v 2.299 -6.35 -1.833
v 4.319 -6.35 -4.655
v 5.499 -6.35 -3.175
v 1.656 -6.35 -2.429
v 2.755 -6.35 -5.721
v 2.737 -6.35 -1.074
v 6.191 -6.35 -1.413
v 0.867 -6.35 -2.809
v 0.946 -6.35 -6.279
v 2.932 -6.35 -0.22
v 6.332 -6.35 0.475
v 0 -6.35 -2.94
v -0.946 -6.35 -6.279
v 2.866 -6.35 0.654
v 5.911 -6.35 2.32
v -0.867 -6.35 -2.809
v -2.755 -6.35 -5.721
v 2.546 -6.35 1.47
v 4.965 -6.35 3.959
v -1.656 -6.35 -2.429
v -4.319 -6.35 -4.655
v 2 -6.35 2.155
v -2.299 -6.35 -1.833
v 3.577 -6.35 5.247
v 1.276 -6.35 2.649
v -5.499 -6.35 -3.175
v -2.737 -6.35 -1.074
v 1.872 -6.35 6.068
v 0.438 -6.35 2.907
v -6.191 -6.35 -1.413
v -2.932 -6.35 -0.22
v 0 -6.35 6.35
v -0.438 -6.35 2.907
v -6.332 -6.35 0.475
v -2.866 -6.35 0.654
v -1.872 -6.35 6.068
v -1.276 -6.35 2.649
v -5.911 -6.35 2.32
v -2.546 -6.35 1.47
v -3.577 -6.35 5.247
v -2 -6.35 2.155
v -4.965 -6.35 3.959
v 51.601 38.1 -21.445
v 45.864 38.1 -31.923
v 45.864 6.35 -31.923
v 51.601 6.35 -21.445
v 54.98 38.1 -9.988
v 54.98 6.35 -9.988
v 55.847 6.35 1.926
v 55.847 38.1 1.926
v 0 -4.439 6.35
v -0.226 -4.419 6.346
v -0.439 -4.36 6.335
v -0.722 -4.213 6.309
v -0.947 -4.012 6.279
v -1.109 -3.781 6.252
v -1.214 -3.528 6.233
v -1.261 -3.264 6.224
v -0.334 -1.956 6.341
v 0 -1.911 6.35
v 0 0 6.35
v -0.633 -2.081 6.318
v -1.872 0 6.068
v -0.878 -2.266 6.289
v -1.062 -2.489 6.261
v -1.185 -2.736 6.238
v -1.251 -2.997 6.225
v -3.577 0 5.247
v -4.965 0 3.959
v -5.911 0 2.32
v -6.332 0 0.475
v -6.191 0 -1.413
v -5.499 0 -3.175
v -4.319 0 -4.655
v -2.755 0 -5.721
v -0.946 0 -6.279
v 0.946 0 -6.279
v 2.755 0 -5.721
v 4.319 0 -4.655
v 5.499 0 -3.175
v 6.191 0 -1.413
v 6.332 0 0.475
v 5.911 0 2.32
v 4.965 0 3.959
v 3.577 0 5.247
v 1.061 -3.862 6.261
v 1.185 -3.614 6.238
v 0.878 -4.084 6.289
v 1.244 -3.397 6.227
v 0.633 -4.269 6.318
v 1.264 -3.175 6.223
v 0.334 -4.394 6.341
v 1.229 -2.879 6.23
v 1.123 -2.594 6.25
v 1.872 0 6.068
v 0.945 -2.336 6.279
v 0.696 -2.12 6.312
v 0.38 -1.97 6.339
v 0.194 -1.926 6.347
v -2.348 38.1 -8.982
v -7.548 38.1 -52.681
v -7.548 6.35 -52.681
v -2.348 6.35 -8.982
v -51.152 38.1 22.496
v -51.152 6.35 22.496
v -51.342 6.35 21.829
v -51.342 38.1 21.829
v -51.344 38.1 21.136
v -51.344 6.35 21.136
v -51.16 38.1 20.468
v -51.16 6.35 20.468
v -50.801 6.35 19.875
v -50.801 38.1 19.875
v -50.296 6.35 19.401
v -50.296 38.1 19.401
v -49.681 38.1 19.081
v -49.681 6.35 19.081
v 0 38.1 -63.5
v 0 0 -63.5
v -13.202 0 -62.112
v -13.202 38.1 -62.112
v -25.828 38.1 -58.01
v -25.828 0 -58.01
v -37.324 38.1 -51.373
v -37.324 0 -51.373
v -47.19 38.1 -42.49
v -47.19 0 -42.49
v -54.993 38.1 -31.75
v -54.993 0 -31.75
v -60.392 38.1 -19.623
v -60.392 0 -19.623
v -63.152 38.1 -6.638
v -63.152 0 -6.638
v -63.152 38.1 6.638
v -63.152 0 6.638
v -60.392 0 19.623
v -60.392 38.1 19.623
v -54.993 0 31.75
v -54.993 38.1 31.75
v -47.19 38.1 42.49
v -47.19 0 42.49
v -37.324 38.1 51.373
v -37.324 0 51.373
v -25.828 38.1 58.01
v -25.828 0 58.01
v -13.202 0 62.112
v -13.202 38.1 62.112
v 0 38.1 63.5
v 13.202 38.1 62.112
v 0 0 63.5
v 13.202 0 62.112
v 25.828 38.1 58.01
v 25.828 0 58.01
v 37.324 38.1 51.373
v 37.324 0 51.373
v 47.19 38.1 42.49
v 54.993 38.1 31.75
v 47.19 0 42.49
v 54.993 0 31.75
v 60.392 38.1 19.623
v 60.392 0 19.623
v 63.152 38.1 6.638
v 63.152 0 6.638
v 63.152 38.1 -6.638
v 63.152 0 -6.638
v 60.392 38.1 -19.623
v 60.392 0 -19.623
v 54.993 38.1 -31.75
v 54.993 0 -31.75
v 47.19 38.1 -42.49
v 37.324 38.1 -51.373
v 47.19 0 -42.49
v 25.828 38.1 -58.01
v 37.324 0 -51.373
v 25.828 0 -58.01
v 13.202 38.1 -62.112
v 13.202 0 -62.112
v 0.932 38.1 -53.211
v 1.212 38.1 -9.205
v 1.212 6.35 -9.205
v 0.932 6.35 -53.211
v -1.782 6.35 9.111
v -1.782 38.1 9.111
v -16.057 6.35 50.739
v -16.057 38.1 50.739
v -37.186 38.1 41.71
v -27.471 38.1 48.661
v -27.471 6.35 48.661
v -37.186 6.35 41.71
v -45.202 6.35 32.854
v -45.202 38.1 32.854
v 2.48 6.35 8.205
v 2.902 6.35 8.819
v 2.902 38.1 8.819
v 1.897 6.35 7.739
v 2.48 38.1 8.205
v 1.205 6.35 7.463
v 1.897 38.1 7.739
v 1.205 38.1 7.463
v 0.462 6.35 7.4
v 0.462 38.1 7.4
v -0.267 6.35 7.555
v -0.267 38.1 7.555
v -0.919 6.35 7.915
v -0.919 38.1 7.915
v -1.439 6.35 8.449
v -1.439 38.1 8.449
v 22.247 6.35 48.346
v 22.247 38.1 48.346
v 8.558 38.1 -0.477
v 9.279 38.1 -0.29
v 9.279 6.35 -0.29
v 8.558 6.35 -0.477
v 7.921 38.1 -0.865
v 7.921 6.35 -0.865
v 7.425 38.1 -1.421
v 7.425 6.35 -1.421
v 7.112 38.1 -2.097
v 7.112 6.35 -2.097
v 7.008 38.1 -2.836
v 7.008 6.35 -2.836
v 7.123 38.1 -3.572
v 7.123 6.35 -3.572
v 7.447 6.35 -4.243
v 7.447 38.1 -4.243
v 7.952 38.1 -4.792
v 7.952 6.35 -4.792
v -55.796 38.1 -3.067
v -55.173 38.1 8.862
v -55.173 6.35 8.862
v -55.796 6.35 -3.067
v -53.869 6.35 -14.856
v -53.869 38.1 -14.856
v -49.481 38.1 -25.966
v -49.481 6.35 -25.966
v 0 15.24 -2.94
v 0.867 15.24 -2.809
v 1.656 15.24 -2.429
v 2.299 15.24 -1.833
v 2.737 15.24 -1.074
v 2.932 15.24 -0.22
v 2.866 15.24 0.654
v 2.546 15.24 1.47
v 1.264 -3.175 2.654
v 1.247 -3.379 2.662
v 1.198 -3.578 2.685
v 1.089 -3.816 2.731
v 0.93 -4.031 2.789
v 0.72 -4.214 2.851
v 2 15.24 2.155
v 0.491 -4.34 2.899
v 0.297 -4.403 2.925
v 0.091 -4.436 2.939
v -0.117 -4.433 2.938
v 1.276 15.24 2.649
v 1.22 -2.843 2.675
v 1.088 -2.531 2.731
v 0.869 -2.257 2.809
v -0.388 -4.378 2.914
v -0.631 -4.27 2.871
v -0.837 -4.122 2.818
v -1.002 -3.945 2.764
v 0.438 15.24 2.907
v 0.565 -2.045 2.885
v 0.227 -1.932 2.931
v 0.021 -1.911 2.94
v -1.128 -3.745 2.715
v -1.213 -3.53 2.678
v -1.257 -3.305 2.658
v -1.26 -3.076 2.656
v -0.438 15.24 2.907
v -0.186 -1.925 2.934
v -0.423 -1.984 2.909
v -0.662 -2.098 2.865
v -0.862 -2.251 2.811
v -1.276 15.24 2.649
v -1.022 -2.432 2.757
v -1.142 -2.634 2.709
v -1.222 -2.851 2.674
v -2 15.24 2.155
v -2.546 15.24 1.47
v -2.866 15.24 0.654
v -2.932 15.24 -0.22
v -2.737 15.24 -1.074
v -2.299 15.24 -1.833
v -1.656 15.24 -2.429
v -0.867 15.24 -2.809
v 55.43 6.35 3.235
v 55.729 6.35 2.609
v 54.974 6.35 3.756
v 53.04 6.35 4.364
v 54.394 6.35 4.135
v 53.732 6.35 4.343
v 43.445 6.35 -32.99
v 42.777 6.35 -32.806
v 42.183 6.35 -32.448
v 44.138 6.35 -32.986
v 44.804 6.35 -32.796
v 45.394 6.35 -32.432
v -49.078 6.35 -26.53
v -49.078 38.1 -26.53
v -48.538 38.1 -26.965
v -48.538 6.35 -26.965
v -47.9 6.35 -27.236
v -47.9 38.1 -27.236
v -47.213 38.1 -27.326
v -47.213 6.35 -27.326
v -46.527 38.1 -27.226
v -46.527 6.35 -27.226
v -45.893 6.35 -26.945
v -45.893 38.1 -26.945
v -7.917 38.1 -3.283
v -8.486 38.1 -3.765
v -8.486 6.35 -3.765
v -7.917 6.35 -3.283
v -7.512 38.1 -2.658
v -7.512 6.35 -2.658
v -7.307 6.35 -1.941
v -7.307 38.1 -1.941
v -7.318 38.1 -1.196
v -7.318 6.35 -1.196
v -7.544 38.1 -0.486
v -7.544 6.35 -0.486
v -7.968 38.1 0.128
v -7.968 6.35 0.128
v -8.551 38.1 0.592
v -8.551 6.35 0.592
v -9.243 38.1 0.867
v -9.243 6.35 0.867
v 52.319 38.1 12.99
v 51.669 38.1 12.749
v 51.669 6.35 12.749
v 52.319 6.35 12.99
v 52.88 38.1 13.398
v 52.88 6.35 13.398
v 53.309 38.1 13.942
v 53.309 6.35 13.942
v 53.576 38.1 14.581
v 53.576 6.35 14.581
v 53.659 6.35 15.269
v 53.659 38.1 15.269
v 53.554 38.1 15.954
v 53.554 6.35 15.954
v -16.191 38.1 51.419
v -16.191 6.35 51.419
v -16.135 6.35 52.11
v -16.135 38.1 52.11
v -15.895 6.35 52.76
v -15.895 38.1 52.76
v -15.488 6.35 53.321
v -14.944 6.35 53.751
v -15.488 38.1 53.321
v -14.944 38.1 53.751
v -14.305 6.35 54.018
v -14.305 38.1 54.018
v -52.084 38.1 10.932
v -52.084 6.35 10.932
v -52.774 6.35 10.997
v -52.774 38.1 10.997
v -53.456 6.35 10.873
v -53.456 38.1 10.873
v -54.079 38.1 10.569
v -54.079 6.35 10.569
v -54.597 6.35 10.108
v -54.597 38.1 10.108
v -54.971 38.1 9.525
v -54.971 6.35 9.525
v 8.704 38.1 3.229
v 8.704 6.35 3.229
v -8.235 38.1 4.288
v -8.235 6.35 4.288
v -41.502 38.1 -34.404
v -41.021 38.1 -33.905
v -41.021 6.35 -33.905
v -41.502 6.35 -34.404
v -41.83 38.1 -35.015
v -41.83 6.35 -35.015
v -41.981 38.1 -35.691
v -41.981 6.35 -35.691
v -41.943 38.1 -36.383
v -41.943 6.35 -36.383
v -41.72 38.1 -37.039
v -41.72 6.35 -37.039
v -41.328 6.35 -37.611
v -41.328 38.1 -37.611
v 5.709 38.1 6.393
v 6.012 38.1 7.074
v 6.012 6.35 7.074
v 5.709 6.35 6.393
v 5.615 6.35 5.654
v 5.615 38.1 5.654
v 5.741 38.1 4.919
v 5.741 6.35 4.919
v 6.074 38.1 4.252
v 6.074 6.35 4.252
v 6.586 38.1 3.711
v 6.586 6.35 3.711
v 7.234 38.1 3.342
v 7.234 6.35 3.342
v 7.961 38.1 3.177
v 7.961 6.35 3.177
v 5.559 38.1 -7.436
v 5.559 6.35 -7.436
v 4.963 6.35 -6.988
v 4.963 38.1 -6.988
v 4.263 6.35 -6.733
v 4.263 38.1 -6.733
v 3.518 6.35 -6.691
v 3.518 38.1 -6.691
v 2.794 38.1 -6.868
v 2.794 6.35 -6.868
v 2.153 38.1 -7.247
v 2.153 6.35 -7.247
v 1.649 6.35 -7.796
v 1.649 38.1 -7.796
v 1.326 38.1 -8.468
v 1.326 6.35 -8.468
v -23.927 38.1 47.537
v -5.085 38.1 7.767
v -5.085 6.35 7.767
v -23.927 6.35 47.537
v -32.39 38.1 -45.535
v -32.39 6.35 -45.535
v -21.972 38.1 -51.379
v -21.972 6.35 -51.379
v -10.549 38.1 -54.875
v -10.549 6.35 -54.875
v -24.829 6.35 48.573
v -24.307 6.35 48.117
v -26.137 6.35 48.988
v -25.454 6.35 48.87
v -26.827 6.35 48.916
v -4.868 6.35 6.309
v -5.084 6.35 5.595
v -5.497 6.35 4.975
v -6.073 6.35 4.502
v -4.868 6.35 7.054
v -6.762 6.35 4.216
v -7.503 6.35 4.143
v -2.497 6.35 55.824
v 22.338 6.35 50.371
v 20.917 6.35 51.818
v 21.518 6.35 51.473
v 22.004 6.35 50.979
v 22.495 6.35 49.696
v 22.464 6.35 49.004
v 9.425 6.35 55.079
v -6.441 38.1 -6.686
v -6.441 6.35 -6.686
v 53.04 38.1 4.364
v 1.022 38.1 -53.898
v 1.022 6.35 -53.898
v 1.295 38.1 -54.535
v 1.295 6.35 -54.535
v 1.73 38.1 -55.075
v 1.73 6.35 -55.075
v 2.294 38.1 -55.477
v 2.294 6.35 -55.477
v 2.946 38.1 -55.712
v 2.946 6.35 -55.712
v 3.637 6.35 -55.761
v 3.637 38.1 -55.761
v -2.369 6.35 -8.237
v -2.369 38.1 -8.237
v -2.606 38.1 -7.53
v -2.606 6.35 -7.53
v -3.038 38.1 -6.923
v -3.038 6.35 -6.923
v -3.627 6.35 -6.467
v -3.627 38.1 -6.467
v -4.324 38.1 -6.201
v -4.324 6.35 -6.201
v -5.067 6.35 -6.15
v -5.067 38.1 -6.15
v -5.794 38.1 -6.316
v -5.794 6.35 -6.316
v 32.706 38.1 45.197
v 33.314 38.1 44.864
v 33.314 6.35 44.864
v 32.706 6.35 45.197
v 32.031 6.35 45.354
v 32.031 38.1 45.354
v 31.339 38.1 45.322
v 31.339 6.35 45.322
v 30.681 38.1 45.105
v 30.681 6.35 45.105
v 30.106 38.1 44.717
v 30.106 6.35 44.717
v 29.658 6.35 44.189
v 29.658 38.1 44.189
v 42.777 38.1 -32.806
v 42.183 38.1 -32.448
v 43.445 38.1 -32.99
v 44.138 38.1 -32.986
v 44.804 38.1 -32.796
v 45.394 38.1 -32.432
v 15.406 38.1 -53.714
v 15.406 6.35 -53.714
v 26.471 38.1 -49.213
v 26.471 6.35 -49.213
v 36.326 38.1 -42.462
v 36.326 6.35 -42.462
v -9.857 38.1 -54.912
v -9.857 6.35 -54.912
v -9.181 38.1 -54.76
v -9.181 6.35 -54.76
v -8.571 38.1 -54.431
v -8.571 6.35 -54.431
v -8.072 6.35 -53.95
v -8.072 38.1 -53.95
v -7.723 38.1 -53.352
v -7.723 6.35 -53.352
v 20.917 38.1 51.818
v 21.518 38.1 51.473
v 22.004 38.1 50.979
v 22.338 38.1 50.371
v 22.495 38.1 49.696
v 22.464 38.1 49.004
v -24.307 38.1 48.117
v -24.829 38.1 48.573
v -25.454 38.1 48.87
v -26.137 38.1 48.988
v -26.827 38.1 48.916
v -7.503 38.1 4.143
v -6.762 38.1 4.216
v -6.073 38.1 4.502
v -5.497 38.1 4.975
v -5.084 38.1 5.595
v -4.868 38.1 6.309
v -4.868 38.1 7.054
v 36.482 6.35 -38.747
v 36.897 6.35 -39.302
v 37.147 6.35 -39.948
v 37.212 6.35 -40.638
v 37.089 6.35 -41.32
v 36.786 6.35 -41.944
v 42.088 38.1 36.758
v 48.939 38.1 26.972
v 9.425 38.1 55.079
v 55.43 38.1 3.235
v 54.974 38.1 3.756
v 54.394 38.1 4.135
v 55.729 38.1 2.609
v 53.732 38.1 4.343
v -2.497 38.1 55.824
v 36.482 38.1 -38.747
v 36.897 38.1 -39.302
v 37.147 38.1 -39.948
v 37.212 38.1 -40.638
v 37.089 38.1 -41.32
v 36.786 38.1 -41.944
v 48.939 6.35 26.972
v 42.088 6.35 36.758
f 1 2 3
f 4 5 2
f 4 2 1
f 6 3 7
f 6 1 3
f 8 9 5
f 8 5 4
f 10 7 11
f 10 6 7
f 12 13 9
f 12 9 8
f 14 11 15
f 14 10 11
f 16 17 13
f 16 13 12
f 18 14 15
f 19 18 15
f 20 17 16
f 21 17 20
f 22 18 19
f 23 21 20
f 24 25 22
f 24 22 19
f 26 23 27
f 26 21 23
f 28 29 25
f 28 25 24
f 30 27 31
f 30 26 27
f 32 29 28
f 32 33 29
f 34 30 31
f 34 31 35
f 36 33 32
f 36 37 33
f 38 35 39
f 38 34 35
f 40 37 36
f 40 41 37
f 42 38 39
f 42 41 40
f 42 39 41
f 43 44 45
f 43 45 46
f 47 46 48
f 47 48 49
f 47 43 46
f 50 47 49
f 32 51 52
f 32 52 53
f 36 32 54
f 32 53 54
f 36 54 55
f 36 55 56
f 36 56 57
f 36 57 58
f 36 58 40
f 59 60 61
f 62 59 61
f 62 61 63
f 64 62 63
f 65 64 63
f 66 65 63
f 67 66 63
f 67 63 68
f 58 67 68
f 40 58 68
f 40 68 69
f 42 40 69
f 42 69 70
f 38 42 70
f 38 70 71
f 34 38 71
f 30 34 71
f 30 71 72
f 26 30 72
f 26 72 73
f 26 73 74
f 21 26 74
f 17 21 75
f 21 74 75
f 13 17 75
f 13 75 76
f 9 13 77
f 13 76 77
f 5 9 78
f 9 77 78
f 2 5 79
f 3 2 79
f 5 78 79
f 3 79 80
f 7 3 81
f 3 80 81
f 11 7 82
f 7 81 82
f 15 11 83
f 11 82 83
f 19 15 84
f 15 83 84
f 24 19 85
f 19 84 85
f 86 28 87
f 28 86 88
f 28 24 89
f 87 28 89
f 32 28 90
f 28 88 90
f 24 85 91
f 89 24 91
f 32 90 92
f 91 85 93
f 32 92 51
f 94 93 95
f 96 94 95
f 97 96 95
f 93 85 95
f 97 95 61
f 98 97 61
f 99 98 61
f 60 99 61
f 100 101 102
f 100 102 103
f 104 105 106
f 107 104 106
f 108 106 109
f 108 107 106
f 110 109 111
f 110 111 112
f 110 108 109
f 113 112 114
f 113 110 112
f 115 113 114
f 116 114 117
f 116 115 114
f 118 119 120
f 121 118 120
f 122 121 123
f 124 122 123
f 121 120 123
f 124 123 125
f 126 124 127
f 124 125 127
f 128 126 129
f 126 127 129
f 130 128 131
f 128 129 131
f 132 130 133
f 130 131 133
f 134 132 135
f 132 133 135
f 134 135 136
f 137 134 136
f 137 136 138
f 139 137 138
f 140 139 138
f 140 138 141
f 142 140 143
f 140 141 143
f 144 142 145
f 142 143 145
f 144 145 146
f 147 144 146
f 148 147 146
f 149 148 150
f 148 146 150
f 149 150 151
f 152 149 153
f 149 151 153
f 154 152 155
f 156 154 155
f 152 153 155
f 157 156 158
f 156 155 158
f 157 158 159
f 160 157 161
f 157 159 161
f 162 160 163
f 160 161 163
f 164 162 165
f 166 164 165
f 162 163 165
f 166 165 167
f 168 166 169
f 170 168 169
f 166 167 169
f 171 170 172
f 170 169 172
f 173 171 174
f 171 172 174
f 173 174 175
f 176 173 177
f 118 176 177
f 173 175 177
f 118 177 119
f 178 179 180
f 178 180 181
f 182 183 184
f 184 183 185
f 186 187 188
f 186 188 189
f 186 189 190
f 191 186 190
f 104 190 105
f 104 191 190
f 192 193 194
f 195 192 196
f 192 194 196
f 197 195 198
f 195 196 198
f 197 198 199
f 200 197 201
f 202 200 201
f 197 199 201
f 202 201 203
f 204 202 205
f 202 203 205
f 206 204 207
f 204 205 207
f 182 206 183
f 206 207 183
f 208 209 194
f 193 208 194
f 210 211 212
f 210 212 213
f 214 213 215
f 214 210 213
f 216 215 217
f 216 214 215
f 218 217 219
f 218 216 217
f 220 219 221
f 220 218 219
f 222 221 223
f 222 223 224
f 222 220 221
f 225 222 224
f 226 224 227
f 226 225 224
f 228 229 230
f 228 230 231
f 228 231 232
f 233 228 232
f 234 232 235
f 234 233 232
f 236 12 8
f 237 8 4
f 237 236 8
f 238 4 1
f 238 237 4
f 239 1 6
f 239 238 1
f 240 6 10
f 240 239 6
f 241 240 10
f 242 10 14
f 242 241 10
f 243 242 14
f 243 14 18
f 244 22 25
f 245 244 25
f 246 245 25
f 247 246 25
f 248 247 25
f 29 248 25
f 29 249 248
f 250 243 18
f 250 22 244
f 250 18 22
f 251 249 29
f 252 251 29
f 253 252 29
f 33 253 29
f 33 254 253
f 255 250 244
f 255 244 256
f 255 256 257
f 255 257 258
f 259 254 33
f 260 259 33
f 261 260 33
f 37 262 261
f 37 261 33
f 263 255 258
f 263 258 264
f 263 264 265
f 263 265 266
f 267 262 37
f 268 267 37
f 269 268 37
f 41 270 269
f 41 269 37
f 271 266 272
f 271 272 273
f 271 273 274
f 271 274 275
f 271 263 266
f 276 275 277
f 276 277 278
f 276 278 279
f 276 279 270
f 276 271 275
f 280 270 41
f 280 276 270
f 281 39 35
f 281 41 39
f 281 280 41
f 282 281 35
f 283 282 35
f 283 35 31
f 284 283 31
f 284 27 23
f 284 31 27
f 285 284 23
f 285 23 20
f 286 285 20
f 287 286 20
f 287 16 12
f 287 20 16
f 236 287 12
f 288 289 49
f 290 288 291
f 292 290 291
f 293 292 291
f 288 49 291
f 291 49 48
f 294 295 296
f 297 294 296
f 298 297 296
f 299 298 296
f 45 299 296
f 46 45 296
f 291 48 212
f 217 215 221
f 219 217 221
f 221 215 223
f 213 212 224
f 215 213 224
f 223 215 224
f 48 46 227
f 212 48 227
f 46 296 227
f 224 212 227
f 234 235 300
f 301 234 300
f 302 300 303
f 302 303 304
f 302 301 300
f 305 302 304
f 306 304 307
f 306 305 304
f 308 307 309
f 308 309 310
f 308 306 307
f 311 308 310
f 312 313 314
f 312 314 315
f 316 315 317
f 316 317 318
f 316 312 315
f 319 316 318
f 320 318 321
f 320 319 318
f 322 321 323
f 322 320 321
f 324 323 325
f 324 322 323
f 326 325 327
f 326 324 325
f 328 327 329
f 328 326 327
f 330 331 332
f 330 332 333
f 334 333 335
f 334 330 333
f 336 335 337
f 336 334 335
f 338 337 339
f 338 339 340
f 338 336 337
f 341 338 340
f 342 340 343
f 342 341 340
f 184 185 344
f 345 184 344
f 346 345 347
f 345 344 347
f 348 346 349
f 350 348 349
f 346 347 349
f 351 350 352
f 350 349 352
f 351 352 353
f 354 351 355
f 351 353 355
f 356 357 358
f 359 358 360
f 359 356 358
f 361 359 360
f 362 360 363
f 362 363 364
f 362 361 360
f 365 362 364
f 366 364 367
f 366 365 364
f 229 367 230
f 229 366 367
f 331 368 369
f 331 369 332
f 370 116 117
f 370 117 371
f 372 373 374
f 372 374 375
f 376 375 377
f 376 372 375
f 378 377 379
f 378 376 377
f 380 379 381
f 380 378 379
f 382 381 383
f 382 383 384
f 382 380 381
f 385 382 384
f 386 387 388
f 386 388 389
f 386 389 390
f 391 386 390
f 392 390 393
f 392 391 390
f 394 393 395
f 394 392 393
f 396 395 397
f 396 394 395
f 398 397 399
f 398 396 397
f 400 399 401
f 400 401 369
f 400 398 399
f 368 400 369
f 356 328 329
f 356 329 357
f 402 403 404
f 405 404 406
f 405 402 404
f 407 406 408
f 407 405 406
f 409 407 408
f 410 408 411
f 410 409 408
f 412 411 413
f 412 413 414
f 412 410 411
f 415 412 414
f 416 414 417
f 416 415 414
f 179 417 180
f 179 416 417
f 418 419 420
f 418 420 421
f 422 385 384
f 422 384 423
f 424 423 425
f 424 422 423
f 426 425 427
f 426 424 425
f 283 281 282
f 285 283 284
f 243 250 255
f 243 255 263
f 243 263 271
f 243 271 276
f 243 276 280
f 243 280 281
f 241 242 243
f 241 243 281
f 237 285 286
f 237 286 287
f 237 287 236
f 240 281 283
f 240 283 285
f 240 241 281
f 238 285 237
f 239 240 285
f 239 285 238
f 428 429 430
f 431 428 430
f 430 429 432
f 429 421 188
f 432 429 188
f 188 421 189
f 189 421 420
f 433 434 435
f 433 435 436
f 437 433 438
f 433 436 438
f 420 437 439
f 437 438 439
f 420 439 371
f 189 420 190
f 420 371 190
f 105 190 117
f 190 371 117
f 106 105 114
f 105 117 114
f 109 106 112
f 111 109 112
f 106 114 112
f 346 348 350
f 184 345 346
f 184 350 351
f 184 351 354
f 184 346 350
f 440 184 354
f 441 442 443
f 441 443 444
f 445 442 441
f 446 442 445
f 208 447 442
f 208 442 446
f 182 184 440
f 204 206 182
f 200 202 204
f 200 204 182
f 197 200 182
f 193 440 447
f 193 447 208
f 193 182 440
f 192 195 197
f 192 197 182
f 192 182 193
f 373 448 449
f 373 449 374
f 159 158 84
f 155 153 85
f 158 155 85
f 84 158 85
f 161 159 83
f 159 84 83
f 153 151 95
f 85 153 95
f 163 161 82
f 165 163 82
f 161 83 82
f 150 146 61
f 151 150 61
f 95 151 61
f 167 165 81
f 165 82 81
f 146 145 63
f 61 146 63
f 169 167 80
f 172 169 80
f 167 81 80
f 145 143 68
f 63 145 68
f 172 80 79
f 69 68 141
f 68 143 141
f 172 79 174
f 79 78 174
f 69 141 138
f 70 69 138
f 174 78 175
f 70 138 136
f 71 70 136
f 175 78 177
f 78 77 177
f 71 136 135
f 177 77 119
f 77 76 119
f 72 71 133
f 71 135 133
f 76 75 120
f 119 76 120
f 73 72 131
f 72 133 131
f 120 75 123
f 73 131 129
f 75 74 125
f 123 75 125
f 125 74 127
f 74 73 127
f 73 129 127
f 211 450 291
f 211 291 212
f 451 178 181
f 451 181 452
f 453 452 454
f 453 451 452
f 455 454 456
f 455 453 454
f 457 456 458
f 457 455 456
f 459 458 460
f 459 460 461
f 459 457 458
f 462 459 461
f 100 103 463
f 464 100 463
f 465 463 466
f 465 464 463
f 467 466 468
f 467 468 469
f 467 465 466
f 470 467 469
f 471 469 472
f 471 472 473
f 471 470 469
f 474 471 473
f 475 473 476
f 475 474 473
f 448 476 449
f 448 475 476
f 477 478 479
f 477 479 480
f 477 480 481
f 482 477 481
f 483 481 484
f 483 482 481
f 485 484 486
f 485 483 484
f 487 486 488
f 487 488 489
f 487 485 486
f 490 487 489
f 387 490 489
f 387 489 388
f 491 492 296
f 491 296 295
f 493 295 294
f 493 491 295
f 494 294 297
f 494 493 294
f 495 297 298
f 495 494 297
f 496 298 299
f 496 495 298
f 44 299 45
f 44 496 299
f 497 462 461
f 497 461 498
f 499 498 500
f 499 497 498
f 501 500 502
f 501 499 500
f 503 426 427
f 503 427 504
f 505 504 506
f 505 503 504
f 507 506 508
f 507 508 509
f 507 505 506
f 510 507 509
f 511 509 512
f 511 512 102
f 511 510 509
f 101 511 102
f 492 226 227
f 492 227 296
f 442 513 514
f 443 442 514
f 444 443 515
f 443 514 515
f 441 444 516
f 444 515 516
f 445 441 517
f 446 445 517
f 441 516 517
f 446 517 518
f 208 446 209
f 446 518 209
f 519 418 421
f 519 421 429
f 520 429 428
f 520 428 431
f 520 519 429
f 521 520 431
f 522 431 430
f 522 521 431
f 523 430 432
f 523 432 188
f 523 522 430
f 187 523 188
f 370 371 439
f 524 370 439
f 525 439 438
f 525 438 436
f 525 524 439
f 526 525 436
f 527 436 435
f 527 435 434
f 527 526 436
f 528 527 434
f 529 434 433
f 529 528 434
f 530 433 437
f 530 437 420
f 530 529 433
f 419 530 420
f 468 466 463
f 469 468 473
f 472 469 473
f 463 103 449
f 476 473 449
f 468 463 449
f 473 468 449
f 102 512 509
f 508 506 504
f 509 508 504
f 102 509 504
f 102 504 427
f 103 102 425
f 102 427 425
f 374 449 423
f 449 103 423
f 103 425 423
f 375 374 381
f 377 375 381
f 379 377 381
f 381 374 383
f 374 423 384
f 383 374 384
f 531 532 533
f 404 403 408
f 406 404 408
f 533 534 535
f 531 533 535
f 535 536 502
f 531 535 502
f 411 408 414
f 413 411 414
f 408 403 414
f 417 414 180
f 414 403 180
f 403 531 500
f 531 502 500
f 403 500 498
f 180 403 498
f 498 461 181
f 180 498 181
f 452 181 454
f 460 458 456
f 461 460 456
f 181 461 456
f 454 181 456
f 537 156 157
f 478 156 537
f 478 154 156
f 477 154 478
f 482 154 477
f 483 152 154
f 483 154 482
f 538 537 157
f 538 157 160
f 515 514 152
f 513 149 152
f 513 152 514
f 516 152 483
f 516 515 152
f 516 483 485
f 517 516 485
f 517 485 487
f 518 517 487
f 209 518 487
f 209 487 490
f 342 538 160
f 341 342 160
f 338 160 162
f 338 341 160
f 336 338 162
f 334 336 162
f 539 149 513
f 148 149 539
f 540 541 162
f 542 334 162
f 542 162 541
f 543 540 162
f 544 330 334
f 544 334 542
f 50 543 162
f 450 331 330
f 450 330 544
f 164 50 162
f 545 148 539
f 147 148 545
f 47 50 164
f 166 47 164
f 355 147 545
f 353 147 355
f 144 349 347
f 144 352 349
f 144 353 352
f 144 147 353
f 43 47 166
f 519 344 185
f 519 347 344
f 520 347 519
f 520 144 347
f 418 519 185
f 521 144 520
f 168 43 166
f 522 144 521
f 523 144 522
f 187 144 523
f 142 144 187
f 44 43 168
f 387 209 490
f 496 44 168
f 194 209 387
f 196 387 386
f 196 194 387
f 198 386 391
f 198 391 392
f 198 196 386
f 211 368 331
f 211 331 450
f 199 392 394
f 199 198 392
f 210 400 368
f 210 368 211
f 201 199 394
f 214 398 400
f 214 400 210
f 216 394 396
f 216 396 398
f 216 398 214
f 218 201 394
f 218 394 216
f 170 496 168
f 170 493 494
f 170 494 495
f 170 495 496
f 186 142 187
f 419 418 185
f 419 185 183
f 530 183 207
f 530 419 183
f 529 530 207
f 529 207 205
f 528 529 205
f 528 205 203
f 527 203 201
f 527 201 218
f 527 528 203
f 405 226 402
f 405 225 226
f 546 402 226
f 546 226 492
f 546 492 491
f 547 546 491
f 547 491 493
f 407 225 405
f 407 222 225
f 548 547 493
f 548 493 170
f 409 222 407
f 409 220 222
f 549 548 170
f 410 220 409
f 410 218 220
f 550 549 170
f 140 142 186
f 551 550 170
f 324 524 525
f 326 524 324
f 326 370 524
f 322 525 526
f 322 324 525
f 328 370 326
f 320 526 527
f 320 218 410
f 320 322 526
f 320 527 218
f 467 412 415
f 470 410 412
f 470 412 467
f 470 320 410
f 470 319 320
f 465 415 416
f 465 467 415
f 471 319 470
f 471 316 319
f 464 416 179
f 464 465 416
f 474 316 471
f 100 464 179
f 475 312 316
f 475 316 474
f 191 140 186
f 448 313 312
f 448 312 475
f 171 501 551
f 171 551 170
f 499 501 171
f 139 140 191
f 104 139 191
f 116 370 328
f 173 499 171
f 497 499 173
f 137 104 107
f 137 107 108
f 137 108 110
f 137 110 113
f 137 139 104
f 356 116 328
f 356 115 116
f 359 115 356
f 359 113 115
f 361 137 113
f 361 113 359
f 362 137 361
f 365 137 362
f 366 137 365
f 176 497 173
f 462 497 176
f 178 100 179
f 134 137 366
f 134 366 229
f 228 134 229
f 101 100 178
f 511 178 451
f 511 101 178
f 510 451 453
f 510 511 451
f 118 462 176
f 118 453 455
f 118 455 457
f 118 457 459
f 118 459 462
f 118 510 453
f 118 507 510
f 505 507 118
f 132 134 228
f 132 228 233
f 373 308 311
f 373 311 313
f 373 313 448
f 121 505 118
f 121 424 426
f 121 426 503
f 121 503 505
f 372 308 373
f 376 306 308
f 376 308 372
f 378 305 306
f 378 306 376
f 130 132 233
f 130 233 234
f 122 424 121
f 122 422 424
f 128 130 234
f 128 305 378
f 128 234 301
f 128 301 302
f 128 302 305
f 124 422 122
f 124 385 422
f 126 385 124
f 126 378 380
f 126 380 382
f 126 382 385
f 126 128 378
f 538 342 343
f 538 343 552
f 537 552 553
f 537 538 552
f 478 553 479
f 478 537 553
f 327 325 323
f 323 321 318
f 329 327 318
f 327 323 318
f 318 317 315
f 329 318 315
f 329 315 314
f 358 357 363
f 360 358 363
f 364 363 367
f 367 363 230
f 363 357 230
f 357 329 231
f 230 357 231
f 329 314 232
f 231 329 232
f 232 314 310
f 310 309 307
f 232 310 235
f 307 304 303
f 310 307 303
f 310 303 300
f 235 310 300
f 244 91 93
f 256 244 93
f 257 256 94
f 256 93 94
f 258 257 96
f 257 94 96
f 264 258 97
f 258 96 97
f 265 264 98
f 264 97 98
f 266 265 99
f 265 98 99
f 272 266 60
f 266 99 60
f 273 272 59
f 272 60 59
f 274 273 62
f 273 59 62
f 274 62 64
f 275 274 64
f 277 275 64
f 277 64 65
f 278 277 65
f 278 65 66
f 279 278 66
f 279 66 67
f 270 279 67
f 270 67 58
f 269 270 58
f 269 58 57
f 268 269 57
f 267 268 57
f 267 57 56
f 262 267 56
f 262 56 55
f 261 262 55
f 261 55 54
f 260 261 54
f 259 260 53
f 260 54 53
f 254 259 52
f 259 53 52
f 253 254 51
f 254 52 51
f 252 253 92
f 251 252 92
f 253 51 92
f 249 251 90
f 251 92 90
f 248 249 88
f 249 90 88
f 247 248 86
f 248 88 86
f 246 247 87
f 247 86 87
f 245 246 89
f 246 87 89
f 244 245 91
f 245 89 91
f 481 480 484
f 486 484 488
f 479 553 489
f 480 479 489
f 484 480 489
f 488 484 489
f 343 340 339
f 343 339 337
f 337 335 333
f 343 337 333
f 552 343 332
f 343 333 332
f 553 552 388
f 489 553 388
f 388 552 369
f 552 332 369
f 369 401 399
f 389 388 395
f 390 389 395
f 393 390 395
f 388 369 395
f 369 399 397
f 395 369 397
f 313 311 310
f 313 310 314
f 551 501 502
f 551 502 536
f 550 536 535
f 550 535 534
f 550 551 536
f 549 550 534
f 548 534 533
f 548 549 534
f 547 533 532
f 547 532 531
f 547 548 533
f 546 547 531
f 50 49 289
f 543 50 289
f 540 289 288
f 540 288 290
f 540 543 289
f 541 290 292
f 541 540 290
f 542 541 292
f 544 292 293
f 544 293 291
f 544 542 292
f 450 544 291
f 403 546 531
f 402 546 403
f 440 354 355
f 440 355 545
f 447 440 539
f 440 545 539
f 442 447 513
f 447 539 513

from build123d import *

# Parameters (mm, degrees)
SKETCH1_R               = 63.5
BOSS_EXTRUDE1_DEPTH     = 38.1
CUT_EXTRUDE2_DEPTH      = 31.75
SKETCH4_R               = 6.35
BOSS_EXTRUDE2_DEPTH     = 6.35
CUT_EXTRUDE3_DEPTH      = 98.550550998
CUT_EXTRUDE3_DEPTH_BACK = 15.24
SKETCH3_R               = 2.94
CUT_EXTRUDE4_REACH      = 103.798
CUT_EXTRUDE4_END_RADIUS = 2.94
SKETCH5_R               = 1.263861724


with BuildPart() as part:
    # Sketch1 → Boss-Extrude1 (new body)
    with BuildSketch(Plane(origin=(0, 0, 0), x_dir=(1, 0, 0), z_dir=(0, 1, 0))):
        with Locations(Location((0, 0, 0), (0, 0, 90))):
            Circle(SKETCH1_R)
    extrude(amount=BOSS_EXTRUDE1_DEPTH)

    # Sketch2 → Cut-Extrude2 (cut)
    with BuildSketch(Plane(origin=(0, 38.1, 0), x_dir=(1, 0, 0), z_dir=(0, 1, 0))):
        with BuildLine():
            Line((-1.7819572, -9.111319007), (-16.057301334, -50.738697991))
            ThreePointArc((-16.057301334, -50.738697991), (-15.89484722, -52.75977688), (-14.304875125, -54.018005773))
            ThreePointArc((-14.304875125, -54.018005773), (3.484226214, -55.771270092), (20.916794468, -51.817584942))
            ThreePointArc((20.916794468, -51.817584942), (22.337802979, -50.371249564), (22.247447967, -48.345666393))
            Line((22.247447967, -48.345666393), (2.902107489, -8.818689111))
            ThreePointArc((2.902107489, -8.818689111), (0.462316687, -7.400205158), (-1.7819572, -9.111319007))
        make_face()
        with BuildLine():
            Line((8.704163204, -3.229403726), (51.669220951, -12.749274735))
            ThreePointArc((51.669220951, -12.749274735), (53.309221074, -13.941562792), (53.554027291, -15.954327341))
            ThreePointArc((53.554027291, -15.954327341), (45.776114287, -32.048740393), (33.314033776, -44.863677441))
            ThreePointArc((33.314033776, -44.863677441), (31.338979429, -45.322274799), (29.657547842, -44.189164464))
            Line((29.657547842, -44.189164464), (6.012483905, -7.074004722))
            ThreePointArc((6.012483905, -7.074004722), (6.073963109, -4.252498707), (8.704163204, -3.229403726))
        make_face()
        with BuildLine():
            Line((7.951806494, 4.791688532), (42.1830167, 32.447580836))
            ThreePointArc((42.1830167, 32.447580836), (44.13770839, 32.986405118), (45.863985261, 31.922864157))
            ThreePointArc((45.863985261, 31.922864157), (53.597654639, 15.807144497), (55.846795761, -1.926084944))
            ThreePointArc((55.846795761, -1.926084944), (54.973915369, -3.756175388), (53.039658589, -4.3642888))
            Line((53.039658589, -4.3642888), (9.279401997, 0.290179402))
            ThreePointArc((9.279401997, 0.290179402), (7.111791423, 2.097426005), (7.951806494, 4.791688532))
        make_face()
        with BuildLine():
            Line((1.211577307, 9.204541593), (0.932140496, 53.210746228))
            ThreePointArc((0.932140496, 53.210746228), (1.729601044, 55.074937175), (3.637426875, 55.761487836))
            ThreePointArc((3.637426875, 55.761487836), (21.059067856, 51.759927174), (36.325781471, 42.461888801))
            ThreePointArc((36.325781471, 42.461888801), (37.212371773, 40.638400701), (36.481824607, 38.746985345))
            Line((36.481824607, 38.746985345), (5.55874112, 7.435852518))
            ThreePointArc((5.55874112, 7.435852518), (2.794295742, 6.867946156), (1.211577307, 9.204541593))
        make_face()
        with BuildLine():
            Line((-6.440994304, 6.686187096), (-41.020656513, 33.905134408))
            ThreePointArc((-41.020656513, 33.905134408), (-41.980931166, 35.690918215), (-41.328188139, 37.610573848))
            ThreePointArc((-41.328188139, 37.610573848), (-27.33742655, 48.736428979), (-10.549287178, 54.875194214))
            ThreePointArc((-10.549287178, 54.875194214), (-8.570846762, 54.431432191), (-7.547567398, 52.680989231))
            Line((-7.547567398, 52.680989231), (-2.347765198, 8.982177024))
            ThreePointArc((-2.347765198, 8.982177024), (-3.627361626, 6.466762771), (-6.440994304, 6.686187096))
        make_face()
        with BuildLine():
            Line((-9.243365832, -0.867002658), (-52.084062499, -10.931735159))
            ThreePointArc((-52.084062499, -10.931735159), (-54.078965953, -10.569090123), (-55.172834542, -8.861869364))
            ThreePointArc((-55.172834542, -8.861869364), (-55.148281182, 9.013405721), (-49.480527415, 25.966359134))
            ThreePointArc((-49.480527415, 25.966359134), (-47.900042872, 27.236485042), (-45.89348721, 26.94513373))
            Line((-45.89348721, 26.94513373), (-8.486356436, 3.764739028))
            ThreePointArc((-8.486356436, 3.764739028), (-7.317541705, 1.195975121), (-9.243365832, -0.867002658))
        make_face()
        with BuildLine():
            Line((-5.085294358, -7.767321727), (-23.927107102, -47.536785185))
            ThreePointArc((-23.927107102, -47.536785185), (-25.454436367, -48.870358028), (-27.471211214, -48.661144195))
            ThreePointArc((-27.471211214, -48.661144195), (-41.431355264, -37.496895885), (-51.15192129, -22.495673991))
            ThreePointArc((-51.15192129, -22.495673991), (-51.159529717, -20.468090867), (-49.680675096, -19.080957051))
            Line((-49.680675096, -19.080957051), (-8.234548188, -4.287624243))
            ThreePointArc((-8.234548188, -4.287624243), (-5.49746363, -4.975406188), (-5.085294358, -7.767321727))
        make_face()
    extrude(amount=-CUT_EXTRUDE2_DEPTH, mode=Mode.SUBTRACT)

    # Sketch4 → Boss-Extrude2 (add)
    with BuildSketch(Plane.XZ):
        with Locations(Location((0, 0, 0), (0, 0, 90))):
            Circle(SKETCH4_R)
    extrude(amount=BOSS_EXTRUDE2_DEPTH)

    # Sketch3 → Cut-Extrude3 (cut, two sides: drawn at the far end of the back side and taken through both)
    with BuildSketch(Plane.XZ.offset(-CUT_EXTRUDE3_DEPTH_BACK)):
        with Locations(Location((0, 0, 0), (0, 0, 270))):
            Circle(SKETCH3_R)
    extrude(amount=CUT_EXTRUDE3_DEPTH + CUT_EXTRUDE3_DEPTH_BACK, mode=Mode.SUBTRACT)

    # Cut-Extrude4: up to this cylinder (the profile starts outside it)
    cut_extrude4_end = Plane(origin=(0, -3.175, 0), z_dir=(0, 1, 0)) * Cylinder(CUT_EXTRUDE4_END_RADIUS, 214.476, mode=Mode.PRIVATE)
    # Sketch5 → Cut-Extrude4 (cut, up to the surface)
    with BuildSketch(Plane.XY.offset(6.35), mode=Mode.PRIVATE) as cut_extrude4_sk1:
        with Locations((0, -3.175)):
            Circle(SKETCH5_R)
    cut_extrude4_tool1 = extrude(cut_extrude4_sk1.sketch, amount=-CUT_EXTRUDE4_REACH, mode=Mode.PRIVATE) - cut_extrude4_end
    add(cut_extrude4_tool1.solids().sort_by_distance((0, -3.175, 6.35))[0], mode=Mode.SUBTRACT)


solid = part.part
